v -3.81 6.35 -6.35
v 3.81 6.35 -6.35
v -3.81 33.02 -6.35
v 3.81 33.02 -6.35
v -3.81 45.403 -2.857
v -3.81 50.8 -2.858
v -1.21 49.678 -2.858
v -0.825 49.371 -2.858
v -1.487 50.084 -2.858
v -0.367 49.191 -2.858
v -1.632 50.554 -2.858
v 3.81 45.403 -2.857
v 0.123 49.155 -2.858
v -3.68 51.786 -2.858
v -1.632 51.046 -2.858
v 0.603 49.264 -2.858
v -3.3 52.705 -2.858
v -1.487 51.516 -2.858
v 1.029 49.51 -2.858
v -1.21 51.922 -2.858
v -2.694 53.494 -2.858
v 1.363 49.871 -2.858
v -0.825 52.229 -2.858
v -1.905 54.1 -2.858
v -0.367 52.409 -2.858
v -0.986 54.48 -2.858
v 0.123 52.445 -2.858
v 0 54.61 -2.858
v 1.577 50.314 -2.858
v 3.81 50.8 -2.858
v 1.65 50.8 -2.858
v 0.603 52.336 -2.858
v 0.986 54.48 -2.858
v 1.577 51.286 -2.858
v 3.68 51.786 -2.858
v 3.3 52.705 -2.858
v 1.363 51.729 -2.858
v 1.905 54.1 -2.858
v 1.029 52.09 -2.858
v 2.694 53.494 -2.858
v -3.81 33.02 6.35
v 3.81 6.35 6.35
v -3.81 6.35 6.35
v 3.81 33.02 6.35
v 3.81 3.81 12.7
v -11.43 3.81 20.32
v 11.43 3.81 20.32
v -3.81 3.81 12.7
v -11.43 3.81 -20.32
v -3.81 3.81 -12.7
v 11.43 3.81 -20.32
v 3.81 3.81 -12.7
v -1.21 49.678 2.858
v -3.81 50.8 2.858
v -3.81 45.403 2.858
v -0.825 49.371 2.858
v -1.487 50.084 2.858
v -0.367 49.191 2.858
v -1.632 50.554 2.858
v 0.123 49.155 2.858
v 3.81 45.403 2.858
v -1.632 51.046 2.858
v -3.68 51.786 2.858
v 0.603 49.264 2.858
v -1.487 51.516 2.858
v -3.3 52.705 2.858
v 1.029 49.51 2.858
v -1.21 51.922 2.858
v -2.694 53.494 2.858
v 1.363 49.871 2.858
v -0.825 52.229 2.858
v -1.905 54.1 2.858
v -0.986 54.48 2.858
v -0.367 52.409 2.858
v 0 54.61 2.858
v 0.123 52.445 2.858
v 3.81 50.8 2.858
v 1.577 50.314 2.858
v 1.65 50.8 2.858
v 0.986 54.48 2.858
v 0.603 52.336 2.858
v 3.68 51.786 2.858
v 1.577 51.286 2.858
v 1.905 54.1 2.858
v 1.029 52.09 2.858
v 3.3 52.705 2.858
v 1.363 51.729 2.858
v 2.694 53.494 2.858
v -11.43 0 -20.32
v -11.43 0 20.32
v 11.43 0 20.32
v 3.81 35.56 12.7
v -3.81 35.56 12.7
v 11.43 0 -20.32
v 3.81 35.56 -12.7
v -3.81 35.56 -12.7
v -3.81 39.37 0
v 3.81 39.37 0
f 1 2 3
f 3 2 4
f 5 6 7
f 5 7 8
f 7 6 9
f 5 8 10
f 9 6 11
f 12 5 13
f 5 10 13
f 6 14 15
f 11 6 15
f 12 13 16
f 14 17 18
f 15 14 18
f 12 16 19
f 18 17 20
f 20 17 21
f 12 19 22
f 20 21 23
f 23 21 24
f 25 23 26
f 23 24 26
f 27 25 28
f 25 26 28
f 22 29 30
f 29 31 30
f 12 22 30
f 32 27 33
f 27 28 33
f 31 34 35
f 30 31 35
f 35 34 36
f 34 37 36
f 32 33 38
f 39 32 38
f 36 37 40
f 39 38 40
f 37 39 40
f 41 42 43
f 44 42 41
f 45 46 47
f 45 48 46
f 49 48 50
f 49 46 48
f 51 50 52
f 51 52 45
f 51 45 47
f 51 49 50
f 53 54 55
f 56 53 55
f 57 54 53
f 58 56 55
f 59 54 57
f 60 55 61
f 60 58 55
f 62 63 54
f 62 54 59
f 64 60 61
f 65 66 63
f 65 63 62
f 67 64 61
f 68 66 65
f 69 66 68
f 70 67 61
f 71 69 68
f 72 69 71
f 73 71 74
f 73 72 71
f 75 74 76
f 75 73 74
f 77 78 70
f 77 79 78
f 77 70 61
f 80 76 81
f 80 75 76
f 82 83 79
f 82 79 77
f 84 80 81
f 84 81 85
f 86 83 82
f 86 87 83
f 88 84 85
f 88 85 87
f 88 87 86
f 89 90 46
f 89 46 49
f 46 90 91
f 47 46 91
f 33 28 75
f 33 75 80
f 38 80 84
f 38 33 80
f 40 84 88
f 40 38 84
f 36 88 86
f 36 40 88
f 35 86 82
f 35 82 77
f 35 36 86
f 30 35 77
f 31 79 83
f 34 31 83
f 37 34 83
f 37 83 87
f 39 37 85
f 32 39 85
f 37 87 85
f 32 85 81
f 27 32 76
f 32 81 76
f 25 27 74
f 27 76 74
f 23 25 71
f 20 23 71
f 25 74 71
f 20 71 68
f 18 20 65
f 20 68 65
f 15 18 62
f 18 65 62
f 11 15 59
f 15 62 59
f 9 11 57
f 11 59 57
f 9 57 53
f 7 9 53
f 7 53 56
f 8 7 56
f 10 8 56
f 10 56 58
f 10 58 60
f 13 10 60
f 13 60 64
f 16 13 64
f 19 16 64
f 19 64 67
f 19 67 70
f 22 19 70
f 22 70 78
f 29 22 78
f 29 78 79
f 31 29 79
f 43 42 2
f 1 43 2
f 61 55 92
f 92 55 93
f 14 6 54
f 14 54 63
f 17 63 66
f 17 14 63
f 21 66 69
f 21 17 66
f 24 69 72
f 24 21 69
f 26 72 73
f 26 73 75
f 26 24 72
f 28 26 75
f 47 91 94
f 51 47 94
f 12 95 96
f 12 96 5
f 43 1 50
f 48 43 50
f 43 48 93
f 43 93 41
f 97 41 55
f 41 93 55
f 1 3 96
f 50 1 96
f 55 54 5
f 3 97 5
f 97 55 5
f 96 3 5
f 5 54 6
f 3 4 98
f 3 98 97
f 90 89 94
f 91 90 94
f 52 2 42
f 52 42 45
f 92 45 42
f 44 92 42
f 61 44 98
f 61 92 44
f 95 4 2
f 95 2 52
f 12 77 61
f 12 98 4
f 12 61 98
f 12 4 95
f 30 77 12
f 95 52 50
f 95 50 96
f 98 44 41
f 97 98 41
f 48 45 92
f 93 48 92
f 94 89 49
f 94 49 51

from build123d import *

# Parameters (mm, degrees)
SKETCH2_W            = 25.4
SKETCH2_H            = 48.26
BOSS_EXTRUDE1_DEPTH  = 3.81
SKETCH5_W            = 12.7
SKETCH5_H            = 33.02
CUT_EXTRUDE2_DEPTH   = 51.481501562
SKETCH4_W            = 22.86
SKETCH4_H            = 40.64
BOSS_EXTRUDE3_DEPTH  = 3.81
CHAMFER1_SIZE        = 6.35
SKETCH9_W            = 7.62
SKETCH9_H            = 6.35
BOSS_EXTRUDE4_DEPTH  = 2.8575
M3_CLEARANCE_HOLE1_D = 3.3
CHAMFER2_SIZE        = 12.7
CUT_EXTRUDE3_START   = -15.5575
CUT_EXTRUDE3_DEPTH   = 5.715


# Read off the part's stored shape, not the designer's step: Cut-Extrude3
# Some blends are built 0.0001 mm under size
with BuildPart() as part:
    # Sketch2 → Boss-Extrude1 (new, symmetric)
    with BuildSketch(Plane(origin=(0, 0, 0), x_dir=(0, 0, -1), z_dir=(1, 0, 0))):
        with Locations((0, 24.13)):
            Rectangle(SKETCH2_W, SKETCH2_H)
    extrude(amount=BOSS_EXTRUDE1_DEPTH, both=True)

    # Sketch5 → Cut-Extrude2 (cut, through all)
    with BuildSketch(Plane(origin=(3.81, 0, 0), x_dir=(0, 0, -1), z_dir=(1, 0, 0))):
        with Locations((0, 22.86)):
            Rectangle(SKETCH5_W, SKETCH5_H)
    extrude(amount=-CUT_EXTRUDE2_DEPTH, mode=Mode.SUBTRACT)

    # Sketch4 → Boss-Extrude3 (add)
    with BuildSketch(Plane(origin=(0, 0, 0), x_dir=(1, 0, 0), z_dir=(0, 1, 0))):
        Rectangle(SKETCH4_W, SKETCH4_H)
    extrude(amount=BOSS_EXTRUDE3_DEPTH)

    # Chamfer1
    chamfer1_edges = [part.edges().sort_by_distance(p)[0] for p in [
        (0, 39.37, 6.35),
        (0, 39.37, -6.35),
    ]]
    chamfer(chamfer1_edges, length=CHAMFER1_SIZE - 0.0001)  # a hair under: the kernel refuses the full size

    # Sketch9 → Boss-Extrude4 (add, symmetric)
    with BuildSketch(Plane.XY):
        with Locations((0, 51.435)):
            Rectangle(SKETCH9_W, SKETCH9_H)
    extrude(amount=BOSS_EXTRUDE4_DEPTH, both=True)

    # M3 Clearance Hole1 (through all)
    with Locations(Plane(origin=(0, 0, -12.7), x_dir=(-1, 0, 0), z_dir=(0, 0, -1))):
        with Locations((0, 50.8)):
            Hole(M3_CLEARANCE_HOLE1_D / 2)

    # Chamfer2
    # the kernel refuses this chamfer: 12.7 mm, written as the material it takes off along each edge
    with BuildSketch(Plane(origin=(36.470373947, 48.26, -12.7), x_dir=(0, -0.9996219169112966, -0.0274958766105866), z_dir=(-1, 0, 0))) as chamfer2_piece_1_section:
        Polygon((CHAMFER2_SIZE * 0.999621916911, CHAMFER2_SIZE * 0.0274958766106), (-CHAMFER2_SIZE * 0.0274958766106, CHAMFER2_SIZE * 0.999621916911), (0, 0), align=None)
    chamfer2_piece_1 = extrude(amount=72.940747894, mode=Mode.PRIVATE)
    chamfer2_piece_1 = split(chamfer2_piece_1, bisect_by=Plane(origin=(0, 43.83103101, -2.8575), z_dir=(0, 0, -1)), keep=Keep.TOP, mode=Mode.PRIVATE)
    add(chamfer2_piece_1, mode=Mode.SUBTRACT)
    with BuildSketch(Plane(origin=(-36.470373947, 48.26, 12.7), x_dir=(0, 0.02749587661058674, -0.9996219169112966), z_dir=(1, 0, 0))) as chamfer2_piece_2_section:
        Polygon((CHAMFER2_SIZE * 0.999621916911, -CHAMFER2_SIZE * 0.0274958766106), (-CHAMFER2_SIZE * 0.0274958766106, -CHAMFER2_SIZE * 0.999621916911), (0, 0), align=None)
    chamfer2_piece_2 = extrude(amount=72.940747894, mode=Mode.PRIVATE)
    chamfer2_piece_2 = split(chamfer2_piece_2, bisect_by=Plane(origin=(0, 43.83103101, 2.8575), z_dir=(0, 0, 1)), keep=Keep.TOP, mode=Mode.PRIVATE)
    add(chamfer2_piece_2, mode=Mode.SUBTRACT)

    # Cut-Extrude3 outline → Cut-Extrude3 (cut)
    with BuildSketch(Plane.XY.offset(12.7).offset(CUT_EXTRUDE3_START)):
        with BuildLine():
            Line((-3.81, 54.61), (-3.81, 50.8))
            ThreePointArc((-3.81, 50.8), (-2.694076836, 53.494076836), (0, 54.61))
            Line((0, 54.61), (-3.81, 54.61))
        make_face()
        with BuildLine():
            Line((3.81, 54.61), (0, 54.61))
            ThreePointArc((0, 54.61), (2.694076836, 53.494076836), (3.81, 50.8))
            Line((3.81, 50.8), (3.81, 54.61))
        make_face()
    extrude(amount=CUT_EXTRUDE3_DEPTH, mode=Mode.SUBTRACT)


solid = part.part
